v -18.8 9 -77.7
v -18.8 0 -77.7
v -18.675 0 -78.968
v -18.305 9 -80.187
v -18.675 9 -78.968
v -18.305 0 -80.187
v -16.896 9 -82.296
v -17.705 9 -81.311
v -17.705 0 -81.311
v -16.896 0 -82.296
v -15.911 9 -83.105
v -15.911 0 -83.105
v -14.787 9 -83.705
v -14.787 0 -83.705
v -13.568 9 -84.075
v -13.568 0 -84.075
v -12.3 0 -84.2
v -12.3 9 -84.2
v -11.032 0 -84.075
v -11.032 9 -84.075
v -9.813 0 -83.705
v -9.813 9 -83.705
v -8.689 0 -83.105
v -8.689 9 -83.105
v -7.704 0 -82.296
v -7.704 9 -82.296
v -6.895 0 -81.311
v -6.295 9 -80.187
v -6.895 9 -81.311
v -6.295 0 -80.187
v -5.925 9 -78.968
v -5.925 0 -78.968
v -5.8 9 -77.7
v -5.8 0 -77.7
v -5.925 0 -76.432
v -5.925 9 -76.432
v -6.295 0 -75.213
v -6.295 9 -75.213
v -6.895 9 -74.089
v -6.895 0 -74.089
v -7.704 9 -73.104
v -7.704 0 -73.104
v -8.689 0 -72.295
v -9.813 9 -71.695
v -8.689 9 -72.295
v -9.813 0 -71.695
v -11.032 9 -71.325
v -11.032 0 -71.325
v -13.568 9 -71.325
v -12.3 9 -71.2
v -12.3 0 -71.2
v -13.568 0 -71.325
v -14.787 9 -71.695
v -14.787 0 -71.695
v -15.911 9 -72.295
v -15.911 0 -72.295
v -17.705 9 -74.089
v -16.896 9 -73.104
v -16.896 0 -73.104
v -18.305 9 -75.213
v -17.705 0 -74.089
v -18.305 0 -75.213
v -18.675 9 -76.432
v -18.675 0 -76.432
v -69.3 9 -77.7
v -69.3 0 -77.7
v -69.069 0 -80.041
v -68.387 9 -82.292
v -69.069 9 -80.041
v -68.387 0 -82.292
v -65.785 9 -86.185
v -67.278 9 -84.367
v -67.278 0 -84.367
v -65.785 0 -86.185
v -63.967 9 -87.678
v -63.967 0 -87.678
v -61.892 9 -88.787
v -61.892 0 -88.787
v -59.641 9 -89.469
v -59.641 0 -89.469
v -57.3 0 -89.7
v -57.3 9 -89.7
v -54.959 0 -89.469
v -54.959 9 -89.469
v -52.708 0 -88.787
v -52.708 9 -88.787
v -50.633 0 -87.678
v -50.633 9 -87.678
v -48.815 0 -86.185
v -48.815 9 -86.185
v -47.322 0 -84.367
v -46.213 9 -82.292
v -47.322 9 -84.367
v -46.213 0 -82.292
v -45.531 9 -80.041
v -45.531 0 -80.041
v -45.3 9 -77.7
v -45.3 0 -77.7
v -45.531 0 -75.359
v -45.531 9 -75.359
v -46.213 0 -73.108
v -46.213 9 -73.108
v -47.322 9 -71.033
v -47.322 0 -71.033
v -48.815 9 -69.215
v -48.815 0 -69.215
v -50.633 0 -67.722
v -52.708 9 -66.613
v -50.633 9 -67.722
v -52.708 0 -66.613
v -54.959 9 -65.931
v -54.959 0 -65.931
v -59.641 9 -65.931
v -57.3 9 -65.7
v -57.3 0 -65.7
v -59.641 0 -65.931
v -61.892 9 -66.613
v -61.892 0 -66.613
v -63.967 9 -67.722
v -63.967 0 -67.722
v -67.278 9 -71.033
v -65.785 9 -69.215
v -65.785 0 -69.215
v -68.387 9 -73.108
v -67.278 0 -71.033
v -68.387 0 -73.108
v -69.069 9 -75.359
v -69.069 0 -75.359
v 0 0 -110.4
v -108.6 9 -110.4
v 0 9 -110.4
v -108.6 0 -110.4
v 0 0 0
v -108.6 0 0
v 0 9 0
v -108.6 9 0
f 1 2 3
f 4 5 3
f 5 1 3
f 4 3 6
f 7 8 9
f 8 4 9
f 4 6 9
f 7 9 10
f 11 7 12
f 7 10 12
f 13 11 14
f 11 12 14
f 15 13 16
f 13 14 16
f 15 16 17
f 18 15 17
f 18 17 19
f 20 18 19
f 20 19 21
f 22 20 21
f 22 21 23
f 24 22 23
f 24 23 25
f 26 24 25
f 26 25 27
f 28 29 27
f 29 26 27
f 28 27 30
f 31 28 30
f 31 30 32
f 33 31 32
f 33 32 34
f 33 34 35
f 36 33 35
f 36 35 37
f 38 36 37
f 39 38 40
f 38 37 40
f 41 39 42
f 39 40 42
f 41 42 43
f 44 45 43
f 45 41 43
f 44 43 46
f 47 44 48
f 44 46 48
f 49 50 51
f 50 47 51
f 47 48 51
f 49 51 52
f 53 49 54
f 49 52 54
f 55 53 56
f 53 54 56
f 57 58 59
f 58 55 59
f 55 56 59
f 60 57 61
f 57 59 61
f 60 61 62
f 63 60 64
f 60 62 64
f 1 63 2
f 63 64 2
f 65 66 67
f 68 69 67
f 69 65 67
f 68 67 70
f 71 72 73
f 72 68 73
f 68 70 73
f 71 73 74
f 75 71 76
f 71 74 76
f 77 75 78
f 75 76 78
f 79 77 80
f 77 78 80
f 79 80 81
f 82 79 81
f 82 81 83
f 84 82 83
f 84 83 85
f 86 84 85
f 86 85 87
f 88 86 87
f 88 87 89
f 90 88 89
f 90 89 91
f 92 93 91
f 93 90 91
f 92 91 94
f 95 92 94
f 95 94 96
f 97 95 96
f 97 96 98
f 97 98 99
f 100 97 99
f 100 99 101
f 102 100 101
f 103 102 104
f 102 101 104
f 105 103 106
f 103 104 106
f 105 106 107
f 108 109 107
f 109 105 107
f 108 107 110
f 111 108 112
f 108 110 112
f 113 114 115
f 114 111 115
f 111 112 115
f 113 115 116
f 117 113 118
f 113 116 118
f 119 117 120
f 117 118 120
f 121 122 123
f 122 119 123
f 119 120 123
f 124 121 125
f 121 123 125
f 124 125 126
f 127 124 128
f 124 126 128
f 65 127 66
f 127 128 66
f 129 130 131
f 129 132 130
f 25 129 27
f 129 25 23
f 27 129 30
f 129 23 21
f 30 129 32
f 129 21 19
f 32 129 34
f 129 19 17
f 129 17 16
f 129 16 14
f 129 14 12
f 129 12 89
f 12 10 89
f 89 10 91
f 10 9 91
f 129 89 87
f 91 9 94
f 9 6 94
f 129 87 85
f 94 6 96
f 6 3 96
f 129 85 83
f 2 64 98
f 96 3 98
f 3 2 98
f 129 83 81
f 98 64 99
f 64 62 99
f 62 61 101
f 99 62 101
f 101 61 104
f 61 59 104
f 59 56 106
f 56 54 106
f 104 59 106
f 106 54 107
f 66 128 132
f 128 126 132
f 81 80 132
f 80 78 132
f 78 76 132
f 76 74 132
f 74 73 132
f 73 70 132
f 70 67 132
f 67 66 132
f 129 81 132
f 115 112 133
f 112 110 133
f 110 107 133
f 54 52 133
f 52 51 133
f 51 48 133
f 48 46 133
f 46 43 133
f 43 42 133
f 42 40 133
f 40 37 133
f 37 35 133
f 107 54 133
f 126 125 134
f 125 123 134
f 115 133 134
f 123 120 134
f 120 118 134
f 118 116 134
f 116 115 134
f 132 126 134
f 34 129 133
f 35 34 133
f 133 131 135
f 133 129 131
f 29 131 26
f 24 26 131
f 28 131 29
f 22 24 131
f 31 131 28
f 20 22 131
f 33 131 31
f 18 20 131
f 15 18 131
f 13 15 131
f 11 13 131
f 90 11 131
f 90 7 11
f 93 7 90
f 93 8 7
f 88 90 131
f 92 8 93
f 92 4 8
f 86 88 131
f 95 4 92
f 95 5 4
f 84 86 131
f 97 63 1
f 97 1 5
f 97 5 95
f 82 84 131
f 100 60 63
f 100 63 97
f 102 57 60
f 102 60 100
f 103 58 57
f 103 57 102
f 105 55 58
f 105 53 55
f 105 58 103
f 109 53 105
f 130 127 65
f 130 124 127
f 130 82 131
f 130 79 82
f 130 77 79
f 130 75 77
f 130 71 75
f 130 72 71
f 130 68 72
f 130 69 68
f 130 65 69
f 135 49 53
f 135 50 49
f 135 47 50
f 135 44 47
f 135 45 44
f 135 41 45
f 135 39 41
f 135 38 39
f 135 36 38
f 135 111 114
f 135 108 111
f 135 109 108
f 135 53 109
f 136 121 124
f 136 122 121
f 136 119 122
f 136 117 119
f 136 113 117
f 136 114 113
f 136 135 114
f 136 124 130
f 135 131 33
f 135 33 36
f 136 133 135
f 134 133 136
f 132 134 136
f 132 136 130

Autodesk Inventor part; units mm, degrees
ref_plane "YZ Plane" through (0, 0, 0) normal (1, 0, 0) x (0, 1, 0)
ref_plane "XZ Plane" through (0, 0, 0) normal (0, 1, 0) x (-1, 0, 0)
ref_plane "XY Plane" through (0, 0, 0) normal (0, 0, 1) x (1, 0, 0)
sketch "Sketch1" plane through (0, 0, 0) normal (0, 1, 0) x (-1, 0, 0)
  line L0 (0, 0) -> (108.6, 0)
  line L1 (108.6, 0) -> (108.6, -110.4)
  line L2 (108.6, -110.4) -> (0, -110.4)
  line L3 (0, -110.4) -> (0, 0)
  circle A0 centre (12.3, -77.7) radius 6.5
  circle A1 centre (57.3, -77.7) radius 12
  dimension "d0" = 108.6
  dimension "d1" = 110.4
  dimension "d2" = 13
  dimension "d3" = 12.3
  dimension "d4" = 32.7
  dimension "d5" = 24
  dimension "d6" = 45
extrude "Extrusion1" add sketch "Sketch1" along normal blind 9
properties part number "Marco_frontal" material "Aluminum 6061"
